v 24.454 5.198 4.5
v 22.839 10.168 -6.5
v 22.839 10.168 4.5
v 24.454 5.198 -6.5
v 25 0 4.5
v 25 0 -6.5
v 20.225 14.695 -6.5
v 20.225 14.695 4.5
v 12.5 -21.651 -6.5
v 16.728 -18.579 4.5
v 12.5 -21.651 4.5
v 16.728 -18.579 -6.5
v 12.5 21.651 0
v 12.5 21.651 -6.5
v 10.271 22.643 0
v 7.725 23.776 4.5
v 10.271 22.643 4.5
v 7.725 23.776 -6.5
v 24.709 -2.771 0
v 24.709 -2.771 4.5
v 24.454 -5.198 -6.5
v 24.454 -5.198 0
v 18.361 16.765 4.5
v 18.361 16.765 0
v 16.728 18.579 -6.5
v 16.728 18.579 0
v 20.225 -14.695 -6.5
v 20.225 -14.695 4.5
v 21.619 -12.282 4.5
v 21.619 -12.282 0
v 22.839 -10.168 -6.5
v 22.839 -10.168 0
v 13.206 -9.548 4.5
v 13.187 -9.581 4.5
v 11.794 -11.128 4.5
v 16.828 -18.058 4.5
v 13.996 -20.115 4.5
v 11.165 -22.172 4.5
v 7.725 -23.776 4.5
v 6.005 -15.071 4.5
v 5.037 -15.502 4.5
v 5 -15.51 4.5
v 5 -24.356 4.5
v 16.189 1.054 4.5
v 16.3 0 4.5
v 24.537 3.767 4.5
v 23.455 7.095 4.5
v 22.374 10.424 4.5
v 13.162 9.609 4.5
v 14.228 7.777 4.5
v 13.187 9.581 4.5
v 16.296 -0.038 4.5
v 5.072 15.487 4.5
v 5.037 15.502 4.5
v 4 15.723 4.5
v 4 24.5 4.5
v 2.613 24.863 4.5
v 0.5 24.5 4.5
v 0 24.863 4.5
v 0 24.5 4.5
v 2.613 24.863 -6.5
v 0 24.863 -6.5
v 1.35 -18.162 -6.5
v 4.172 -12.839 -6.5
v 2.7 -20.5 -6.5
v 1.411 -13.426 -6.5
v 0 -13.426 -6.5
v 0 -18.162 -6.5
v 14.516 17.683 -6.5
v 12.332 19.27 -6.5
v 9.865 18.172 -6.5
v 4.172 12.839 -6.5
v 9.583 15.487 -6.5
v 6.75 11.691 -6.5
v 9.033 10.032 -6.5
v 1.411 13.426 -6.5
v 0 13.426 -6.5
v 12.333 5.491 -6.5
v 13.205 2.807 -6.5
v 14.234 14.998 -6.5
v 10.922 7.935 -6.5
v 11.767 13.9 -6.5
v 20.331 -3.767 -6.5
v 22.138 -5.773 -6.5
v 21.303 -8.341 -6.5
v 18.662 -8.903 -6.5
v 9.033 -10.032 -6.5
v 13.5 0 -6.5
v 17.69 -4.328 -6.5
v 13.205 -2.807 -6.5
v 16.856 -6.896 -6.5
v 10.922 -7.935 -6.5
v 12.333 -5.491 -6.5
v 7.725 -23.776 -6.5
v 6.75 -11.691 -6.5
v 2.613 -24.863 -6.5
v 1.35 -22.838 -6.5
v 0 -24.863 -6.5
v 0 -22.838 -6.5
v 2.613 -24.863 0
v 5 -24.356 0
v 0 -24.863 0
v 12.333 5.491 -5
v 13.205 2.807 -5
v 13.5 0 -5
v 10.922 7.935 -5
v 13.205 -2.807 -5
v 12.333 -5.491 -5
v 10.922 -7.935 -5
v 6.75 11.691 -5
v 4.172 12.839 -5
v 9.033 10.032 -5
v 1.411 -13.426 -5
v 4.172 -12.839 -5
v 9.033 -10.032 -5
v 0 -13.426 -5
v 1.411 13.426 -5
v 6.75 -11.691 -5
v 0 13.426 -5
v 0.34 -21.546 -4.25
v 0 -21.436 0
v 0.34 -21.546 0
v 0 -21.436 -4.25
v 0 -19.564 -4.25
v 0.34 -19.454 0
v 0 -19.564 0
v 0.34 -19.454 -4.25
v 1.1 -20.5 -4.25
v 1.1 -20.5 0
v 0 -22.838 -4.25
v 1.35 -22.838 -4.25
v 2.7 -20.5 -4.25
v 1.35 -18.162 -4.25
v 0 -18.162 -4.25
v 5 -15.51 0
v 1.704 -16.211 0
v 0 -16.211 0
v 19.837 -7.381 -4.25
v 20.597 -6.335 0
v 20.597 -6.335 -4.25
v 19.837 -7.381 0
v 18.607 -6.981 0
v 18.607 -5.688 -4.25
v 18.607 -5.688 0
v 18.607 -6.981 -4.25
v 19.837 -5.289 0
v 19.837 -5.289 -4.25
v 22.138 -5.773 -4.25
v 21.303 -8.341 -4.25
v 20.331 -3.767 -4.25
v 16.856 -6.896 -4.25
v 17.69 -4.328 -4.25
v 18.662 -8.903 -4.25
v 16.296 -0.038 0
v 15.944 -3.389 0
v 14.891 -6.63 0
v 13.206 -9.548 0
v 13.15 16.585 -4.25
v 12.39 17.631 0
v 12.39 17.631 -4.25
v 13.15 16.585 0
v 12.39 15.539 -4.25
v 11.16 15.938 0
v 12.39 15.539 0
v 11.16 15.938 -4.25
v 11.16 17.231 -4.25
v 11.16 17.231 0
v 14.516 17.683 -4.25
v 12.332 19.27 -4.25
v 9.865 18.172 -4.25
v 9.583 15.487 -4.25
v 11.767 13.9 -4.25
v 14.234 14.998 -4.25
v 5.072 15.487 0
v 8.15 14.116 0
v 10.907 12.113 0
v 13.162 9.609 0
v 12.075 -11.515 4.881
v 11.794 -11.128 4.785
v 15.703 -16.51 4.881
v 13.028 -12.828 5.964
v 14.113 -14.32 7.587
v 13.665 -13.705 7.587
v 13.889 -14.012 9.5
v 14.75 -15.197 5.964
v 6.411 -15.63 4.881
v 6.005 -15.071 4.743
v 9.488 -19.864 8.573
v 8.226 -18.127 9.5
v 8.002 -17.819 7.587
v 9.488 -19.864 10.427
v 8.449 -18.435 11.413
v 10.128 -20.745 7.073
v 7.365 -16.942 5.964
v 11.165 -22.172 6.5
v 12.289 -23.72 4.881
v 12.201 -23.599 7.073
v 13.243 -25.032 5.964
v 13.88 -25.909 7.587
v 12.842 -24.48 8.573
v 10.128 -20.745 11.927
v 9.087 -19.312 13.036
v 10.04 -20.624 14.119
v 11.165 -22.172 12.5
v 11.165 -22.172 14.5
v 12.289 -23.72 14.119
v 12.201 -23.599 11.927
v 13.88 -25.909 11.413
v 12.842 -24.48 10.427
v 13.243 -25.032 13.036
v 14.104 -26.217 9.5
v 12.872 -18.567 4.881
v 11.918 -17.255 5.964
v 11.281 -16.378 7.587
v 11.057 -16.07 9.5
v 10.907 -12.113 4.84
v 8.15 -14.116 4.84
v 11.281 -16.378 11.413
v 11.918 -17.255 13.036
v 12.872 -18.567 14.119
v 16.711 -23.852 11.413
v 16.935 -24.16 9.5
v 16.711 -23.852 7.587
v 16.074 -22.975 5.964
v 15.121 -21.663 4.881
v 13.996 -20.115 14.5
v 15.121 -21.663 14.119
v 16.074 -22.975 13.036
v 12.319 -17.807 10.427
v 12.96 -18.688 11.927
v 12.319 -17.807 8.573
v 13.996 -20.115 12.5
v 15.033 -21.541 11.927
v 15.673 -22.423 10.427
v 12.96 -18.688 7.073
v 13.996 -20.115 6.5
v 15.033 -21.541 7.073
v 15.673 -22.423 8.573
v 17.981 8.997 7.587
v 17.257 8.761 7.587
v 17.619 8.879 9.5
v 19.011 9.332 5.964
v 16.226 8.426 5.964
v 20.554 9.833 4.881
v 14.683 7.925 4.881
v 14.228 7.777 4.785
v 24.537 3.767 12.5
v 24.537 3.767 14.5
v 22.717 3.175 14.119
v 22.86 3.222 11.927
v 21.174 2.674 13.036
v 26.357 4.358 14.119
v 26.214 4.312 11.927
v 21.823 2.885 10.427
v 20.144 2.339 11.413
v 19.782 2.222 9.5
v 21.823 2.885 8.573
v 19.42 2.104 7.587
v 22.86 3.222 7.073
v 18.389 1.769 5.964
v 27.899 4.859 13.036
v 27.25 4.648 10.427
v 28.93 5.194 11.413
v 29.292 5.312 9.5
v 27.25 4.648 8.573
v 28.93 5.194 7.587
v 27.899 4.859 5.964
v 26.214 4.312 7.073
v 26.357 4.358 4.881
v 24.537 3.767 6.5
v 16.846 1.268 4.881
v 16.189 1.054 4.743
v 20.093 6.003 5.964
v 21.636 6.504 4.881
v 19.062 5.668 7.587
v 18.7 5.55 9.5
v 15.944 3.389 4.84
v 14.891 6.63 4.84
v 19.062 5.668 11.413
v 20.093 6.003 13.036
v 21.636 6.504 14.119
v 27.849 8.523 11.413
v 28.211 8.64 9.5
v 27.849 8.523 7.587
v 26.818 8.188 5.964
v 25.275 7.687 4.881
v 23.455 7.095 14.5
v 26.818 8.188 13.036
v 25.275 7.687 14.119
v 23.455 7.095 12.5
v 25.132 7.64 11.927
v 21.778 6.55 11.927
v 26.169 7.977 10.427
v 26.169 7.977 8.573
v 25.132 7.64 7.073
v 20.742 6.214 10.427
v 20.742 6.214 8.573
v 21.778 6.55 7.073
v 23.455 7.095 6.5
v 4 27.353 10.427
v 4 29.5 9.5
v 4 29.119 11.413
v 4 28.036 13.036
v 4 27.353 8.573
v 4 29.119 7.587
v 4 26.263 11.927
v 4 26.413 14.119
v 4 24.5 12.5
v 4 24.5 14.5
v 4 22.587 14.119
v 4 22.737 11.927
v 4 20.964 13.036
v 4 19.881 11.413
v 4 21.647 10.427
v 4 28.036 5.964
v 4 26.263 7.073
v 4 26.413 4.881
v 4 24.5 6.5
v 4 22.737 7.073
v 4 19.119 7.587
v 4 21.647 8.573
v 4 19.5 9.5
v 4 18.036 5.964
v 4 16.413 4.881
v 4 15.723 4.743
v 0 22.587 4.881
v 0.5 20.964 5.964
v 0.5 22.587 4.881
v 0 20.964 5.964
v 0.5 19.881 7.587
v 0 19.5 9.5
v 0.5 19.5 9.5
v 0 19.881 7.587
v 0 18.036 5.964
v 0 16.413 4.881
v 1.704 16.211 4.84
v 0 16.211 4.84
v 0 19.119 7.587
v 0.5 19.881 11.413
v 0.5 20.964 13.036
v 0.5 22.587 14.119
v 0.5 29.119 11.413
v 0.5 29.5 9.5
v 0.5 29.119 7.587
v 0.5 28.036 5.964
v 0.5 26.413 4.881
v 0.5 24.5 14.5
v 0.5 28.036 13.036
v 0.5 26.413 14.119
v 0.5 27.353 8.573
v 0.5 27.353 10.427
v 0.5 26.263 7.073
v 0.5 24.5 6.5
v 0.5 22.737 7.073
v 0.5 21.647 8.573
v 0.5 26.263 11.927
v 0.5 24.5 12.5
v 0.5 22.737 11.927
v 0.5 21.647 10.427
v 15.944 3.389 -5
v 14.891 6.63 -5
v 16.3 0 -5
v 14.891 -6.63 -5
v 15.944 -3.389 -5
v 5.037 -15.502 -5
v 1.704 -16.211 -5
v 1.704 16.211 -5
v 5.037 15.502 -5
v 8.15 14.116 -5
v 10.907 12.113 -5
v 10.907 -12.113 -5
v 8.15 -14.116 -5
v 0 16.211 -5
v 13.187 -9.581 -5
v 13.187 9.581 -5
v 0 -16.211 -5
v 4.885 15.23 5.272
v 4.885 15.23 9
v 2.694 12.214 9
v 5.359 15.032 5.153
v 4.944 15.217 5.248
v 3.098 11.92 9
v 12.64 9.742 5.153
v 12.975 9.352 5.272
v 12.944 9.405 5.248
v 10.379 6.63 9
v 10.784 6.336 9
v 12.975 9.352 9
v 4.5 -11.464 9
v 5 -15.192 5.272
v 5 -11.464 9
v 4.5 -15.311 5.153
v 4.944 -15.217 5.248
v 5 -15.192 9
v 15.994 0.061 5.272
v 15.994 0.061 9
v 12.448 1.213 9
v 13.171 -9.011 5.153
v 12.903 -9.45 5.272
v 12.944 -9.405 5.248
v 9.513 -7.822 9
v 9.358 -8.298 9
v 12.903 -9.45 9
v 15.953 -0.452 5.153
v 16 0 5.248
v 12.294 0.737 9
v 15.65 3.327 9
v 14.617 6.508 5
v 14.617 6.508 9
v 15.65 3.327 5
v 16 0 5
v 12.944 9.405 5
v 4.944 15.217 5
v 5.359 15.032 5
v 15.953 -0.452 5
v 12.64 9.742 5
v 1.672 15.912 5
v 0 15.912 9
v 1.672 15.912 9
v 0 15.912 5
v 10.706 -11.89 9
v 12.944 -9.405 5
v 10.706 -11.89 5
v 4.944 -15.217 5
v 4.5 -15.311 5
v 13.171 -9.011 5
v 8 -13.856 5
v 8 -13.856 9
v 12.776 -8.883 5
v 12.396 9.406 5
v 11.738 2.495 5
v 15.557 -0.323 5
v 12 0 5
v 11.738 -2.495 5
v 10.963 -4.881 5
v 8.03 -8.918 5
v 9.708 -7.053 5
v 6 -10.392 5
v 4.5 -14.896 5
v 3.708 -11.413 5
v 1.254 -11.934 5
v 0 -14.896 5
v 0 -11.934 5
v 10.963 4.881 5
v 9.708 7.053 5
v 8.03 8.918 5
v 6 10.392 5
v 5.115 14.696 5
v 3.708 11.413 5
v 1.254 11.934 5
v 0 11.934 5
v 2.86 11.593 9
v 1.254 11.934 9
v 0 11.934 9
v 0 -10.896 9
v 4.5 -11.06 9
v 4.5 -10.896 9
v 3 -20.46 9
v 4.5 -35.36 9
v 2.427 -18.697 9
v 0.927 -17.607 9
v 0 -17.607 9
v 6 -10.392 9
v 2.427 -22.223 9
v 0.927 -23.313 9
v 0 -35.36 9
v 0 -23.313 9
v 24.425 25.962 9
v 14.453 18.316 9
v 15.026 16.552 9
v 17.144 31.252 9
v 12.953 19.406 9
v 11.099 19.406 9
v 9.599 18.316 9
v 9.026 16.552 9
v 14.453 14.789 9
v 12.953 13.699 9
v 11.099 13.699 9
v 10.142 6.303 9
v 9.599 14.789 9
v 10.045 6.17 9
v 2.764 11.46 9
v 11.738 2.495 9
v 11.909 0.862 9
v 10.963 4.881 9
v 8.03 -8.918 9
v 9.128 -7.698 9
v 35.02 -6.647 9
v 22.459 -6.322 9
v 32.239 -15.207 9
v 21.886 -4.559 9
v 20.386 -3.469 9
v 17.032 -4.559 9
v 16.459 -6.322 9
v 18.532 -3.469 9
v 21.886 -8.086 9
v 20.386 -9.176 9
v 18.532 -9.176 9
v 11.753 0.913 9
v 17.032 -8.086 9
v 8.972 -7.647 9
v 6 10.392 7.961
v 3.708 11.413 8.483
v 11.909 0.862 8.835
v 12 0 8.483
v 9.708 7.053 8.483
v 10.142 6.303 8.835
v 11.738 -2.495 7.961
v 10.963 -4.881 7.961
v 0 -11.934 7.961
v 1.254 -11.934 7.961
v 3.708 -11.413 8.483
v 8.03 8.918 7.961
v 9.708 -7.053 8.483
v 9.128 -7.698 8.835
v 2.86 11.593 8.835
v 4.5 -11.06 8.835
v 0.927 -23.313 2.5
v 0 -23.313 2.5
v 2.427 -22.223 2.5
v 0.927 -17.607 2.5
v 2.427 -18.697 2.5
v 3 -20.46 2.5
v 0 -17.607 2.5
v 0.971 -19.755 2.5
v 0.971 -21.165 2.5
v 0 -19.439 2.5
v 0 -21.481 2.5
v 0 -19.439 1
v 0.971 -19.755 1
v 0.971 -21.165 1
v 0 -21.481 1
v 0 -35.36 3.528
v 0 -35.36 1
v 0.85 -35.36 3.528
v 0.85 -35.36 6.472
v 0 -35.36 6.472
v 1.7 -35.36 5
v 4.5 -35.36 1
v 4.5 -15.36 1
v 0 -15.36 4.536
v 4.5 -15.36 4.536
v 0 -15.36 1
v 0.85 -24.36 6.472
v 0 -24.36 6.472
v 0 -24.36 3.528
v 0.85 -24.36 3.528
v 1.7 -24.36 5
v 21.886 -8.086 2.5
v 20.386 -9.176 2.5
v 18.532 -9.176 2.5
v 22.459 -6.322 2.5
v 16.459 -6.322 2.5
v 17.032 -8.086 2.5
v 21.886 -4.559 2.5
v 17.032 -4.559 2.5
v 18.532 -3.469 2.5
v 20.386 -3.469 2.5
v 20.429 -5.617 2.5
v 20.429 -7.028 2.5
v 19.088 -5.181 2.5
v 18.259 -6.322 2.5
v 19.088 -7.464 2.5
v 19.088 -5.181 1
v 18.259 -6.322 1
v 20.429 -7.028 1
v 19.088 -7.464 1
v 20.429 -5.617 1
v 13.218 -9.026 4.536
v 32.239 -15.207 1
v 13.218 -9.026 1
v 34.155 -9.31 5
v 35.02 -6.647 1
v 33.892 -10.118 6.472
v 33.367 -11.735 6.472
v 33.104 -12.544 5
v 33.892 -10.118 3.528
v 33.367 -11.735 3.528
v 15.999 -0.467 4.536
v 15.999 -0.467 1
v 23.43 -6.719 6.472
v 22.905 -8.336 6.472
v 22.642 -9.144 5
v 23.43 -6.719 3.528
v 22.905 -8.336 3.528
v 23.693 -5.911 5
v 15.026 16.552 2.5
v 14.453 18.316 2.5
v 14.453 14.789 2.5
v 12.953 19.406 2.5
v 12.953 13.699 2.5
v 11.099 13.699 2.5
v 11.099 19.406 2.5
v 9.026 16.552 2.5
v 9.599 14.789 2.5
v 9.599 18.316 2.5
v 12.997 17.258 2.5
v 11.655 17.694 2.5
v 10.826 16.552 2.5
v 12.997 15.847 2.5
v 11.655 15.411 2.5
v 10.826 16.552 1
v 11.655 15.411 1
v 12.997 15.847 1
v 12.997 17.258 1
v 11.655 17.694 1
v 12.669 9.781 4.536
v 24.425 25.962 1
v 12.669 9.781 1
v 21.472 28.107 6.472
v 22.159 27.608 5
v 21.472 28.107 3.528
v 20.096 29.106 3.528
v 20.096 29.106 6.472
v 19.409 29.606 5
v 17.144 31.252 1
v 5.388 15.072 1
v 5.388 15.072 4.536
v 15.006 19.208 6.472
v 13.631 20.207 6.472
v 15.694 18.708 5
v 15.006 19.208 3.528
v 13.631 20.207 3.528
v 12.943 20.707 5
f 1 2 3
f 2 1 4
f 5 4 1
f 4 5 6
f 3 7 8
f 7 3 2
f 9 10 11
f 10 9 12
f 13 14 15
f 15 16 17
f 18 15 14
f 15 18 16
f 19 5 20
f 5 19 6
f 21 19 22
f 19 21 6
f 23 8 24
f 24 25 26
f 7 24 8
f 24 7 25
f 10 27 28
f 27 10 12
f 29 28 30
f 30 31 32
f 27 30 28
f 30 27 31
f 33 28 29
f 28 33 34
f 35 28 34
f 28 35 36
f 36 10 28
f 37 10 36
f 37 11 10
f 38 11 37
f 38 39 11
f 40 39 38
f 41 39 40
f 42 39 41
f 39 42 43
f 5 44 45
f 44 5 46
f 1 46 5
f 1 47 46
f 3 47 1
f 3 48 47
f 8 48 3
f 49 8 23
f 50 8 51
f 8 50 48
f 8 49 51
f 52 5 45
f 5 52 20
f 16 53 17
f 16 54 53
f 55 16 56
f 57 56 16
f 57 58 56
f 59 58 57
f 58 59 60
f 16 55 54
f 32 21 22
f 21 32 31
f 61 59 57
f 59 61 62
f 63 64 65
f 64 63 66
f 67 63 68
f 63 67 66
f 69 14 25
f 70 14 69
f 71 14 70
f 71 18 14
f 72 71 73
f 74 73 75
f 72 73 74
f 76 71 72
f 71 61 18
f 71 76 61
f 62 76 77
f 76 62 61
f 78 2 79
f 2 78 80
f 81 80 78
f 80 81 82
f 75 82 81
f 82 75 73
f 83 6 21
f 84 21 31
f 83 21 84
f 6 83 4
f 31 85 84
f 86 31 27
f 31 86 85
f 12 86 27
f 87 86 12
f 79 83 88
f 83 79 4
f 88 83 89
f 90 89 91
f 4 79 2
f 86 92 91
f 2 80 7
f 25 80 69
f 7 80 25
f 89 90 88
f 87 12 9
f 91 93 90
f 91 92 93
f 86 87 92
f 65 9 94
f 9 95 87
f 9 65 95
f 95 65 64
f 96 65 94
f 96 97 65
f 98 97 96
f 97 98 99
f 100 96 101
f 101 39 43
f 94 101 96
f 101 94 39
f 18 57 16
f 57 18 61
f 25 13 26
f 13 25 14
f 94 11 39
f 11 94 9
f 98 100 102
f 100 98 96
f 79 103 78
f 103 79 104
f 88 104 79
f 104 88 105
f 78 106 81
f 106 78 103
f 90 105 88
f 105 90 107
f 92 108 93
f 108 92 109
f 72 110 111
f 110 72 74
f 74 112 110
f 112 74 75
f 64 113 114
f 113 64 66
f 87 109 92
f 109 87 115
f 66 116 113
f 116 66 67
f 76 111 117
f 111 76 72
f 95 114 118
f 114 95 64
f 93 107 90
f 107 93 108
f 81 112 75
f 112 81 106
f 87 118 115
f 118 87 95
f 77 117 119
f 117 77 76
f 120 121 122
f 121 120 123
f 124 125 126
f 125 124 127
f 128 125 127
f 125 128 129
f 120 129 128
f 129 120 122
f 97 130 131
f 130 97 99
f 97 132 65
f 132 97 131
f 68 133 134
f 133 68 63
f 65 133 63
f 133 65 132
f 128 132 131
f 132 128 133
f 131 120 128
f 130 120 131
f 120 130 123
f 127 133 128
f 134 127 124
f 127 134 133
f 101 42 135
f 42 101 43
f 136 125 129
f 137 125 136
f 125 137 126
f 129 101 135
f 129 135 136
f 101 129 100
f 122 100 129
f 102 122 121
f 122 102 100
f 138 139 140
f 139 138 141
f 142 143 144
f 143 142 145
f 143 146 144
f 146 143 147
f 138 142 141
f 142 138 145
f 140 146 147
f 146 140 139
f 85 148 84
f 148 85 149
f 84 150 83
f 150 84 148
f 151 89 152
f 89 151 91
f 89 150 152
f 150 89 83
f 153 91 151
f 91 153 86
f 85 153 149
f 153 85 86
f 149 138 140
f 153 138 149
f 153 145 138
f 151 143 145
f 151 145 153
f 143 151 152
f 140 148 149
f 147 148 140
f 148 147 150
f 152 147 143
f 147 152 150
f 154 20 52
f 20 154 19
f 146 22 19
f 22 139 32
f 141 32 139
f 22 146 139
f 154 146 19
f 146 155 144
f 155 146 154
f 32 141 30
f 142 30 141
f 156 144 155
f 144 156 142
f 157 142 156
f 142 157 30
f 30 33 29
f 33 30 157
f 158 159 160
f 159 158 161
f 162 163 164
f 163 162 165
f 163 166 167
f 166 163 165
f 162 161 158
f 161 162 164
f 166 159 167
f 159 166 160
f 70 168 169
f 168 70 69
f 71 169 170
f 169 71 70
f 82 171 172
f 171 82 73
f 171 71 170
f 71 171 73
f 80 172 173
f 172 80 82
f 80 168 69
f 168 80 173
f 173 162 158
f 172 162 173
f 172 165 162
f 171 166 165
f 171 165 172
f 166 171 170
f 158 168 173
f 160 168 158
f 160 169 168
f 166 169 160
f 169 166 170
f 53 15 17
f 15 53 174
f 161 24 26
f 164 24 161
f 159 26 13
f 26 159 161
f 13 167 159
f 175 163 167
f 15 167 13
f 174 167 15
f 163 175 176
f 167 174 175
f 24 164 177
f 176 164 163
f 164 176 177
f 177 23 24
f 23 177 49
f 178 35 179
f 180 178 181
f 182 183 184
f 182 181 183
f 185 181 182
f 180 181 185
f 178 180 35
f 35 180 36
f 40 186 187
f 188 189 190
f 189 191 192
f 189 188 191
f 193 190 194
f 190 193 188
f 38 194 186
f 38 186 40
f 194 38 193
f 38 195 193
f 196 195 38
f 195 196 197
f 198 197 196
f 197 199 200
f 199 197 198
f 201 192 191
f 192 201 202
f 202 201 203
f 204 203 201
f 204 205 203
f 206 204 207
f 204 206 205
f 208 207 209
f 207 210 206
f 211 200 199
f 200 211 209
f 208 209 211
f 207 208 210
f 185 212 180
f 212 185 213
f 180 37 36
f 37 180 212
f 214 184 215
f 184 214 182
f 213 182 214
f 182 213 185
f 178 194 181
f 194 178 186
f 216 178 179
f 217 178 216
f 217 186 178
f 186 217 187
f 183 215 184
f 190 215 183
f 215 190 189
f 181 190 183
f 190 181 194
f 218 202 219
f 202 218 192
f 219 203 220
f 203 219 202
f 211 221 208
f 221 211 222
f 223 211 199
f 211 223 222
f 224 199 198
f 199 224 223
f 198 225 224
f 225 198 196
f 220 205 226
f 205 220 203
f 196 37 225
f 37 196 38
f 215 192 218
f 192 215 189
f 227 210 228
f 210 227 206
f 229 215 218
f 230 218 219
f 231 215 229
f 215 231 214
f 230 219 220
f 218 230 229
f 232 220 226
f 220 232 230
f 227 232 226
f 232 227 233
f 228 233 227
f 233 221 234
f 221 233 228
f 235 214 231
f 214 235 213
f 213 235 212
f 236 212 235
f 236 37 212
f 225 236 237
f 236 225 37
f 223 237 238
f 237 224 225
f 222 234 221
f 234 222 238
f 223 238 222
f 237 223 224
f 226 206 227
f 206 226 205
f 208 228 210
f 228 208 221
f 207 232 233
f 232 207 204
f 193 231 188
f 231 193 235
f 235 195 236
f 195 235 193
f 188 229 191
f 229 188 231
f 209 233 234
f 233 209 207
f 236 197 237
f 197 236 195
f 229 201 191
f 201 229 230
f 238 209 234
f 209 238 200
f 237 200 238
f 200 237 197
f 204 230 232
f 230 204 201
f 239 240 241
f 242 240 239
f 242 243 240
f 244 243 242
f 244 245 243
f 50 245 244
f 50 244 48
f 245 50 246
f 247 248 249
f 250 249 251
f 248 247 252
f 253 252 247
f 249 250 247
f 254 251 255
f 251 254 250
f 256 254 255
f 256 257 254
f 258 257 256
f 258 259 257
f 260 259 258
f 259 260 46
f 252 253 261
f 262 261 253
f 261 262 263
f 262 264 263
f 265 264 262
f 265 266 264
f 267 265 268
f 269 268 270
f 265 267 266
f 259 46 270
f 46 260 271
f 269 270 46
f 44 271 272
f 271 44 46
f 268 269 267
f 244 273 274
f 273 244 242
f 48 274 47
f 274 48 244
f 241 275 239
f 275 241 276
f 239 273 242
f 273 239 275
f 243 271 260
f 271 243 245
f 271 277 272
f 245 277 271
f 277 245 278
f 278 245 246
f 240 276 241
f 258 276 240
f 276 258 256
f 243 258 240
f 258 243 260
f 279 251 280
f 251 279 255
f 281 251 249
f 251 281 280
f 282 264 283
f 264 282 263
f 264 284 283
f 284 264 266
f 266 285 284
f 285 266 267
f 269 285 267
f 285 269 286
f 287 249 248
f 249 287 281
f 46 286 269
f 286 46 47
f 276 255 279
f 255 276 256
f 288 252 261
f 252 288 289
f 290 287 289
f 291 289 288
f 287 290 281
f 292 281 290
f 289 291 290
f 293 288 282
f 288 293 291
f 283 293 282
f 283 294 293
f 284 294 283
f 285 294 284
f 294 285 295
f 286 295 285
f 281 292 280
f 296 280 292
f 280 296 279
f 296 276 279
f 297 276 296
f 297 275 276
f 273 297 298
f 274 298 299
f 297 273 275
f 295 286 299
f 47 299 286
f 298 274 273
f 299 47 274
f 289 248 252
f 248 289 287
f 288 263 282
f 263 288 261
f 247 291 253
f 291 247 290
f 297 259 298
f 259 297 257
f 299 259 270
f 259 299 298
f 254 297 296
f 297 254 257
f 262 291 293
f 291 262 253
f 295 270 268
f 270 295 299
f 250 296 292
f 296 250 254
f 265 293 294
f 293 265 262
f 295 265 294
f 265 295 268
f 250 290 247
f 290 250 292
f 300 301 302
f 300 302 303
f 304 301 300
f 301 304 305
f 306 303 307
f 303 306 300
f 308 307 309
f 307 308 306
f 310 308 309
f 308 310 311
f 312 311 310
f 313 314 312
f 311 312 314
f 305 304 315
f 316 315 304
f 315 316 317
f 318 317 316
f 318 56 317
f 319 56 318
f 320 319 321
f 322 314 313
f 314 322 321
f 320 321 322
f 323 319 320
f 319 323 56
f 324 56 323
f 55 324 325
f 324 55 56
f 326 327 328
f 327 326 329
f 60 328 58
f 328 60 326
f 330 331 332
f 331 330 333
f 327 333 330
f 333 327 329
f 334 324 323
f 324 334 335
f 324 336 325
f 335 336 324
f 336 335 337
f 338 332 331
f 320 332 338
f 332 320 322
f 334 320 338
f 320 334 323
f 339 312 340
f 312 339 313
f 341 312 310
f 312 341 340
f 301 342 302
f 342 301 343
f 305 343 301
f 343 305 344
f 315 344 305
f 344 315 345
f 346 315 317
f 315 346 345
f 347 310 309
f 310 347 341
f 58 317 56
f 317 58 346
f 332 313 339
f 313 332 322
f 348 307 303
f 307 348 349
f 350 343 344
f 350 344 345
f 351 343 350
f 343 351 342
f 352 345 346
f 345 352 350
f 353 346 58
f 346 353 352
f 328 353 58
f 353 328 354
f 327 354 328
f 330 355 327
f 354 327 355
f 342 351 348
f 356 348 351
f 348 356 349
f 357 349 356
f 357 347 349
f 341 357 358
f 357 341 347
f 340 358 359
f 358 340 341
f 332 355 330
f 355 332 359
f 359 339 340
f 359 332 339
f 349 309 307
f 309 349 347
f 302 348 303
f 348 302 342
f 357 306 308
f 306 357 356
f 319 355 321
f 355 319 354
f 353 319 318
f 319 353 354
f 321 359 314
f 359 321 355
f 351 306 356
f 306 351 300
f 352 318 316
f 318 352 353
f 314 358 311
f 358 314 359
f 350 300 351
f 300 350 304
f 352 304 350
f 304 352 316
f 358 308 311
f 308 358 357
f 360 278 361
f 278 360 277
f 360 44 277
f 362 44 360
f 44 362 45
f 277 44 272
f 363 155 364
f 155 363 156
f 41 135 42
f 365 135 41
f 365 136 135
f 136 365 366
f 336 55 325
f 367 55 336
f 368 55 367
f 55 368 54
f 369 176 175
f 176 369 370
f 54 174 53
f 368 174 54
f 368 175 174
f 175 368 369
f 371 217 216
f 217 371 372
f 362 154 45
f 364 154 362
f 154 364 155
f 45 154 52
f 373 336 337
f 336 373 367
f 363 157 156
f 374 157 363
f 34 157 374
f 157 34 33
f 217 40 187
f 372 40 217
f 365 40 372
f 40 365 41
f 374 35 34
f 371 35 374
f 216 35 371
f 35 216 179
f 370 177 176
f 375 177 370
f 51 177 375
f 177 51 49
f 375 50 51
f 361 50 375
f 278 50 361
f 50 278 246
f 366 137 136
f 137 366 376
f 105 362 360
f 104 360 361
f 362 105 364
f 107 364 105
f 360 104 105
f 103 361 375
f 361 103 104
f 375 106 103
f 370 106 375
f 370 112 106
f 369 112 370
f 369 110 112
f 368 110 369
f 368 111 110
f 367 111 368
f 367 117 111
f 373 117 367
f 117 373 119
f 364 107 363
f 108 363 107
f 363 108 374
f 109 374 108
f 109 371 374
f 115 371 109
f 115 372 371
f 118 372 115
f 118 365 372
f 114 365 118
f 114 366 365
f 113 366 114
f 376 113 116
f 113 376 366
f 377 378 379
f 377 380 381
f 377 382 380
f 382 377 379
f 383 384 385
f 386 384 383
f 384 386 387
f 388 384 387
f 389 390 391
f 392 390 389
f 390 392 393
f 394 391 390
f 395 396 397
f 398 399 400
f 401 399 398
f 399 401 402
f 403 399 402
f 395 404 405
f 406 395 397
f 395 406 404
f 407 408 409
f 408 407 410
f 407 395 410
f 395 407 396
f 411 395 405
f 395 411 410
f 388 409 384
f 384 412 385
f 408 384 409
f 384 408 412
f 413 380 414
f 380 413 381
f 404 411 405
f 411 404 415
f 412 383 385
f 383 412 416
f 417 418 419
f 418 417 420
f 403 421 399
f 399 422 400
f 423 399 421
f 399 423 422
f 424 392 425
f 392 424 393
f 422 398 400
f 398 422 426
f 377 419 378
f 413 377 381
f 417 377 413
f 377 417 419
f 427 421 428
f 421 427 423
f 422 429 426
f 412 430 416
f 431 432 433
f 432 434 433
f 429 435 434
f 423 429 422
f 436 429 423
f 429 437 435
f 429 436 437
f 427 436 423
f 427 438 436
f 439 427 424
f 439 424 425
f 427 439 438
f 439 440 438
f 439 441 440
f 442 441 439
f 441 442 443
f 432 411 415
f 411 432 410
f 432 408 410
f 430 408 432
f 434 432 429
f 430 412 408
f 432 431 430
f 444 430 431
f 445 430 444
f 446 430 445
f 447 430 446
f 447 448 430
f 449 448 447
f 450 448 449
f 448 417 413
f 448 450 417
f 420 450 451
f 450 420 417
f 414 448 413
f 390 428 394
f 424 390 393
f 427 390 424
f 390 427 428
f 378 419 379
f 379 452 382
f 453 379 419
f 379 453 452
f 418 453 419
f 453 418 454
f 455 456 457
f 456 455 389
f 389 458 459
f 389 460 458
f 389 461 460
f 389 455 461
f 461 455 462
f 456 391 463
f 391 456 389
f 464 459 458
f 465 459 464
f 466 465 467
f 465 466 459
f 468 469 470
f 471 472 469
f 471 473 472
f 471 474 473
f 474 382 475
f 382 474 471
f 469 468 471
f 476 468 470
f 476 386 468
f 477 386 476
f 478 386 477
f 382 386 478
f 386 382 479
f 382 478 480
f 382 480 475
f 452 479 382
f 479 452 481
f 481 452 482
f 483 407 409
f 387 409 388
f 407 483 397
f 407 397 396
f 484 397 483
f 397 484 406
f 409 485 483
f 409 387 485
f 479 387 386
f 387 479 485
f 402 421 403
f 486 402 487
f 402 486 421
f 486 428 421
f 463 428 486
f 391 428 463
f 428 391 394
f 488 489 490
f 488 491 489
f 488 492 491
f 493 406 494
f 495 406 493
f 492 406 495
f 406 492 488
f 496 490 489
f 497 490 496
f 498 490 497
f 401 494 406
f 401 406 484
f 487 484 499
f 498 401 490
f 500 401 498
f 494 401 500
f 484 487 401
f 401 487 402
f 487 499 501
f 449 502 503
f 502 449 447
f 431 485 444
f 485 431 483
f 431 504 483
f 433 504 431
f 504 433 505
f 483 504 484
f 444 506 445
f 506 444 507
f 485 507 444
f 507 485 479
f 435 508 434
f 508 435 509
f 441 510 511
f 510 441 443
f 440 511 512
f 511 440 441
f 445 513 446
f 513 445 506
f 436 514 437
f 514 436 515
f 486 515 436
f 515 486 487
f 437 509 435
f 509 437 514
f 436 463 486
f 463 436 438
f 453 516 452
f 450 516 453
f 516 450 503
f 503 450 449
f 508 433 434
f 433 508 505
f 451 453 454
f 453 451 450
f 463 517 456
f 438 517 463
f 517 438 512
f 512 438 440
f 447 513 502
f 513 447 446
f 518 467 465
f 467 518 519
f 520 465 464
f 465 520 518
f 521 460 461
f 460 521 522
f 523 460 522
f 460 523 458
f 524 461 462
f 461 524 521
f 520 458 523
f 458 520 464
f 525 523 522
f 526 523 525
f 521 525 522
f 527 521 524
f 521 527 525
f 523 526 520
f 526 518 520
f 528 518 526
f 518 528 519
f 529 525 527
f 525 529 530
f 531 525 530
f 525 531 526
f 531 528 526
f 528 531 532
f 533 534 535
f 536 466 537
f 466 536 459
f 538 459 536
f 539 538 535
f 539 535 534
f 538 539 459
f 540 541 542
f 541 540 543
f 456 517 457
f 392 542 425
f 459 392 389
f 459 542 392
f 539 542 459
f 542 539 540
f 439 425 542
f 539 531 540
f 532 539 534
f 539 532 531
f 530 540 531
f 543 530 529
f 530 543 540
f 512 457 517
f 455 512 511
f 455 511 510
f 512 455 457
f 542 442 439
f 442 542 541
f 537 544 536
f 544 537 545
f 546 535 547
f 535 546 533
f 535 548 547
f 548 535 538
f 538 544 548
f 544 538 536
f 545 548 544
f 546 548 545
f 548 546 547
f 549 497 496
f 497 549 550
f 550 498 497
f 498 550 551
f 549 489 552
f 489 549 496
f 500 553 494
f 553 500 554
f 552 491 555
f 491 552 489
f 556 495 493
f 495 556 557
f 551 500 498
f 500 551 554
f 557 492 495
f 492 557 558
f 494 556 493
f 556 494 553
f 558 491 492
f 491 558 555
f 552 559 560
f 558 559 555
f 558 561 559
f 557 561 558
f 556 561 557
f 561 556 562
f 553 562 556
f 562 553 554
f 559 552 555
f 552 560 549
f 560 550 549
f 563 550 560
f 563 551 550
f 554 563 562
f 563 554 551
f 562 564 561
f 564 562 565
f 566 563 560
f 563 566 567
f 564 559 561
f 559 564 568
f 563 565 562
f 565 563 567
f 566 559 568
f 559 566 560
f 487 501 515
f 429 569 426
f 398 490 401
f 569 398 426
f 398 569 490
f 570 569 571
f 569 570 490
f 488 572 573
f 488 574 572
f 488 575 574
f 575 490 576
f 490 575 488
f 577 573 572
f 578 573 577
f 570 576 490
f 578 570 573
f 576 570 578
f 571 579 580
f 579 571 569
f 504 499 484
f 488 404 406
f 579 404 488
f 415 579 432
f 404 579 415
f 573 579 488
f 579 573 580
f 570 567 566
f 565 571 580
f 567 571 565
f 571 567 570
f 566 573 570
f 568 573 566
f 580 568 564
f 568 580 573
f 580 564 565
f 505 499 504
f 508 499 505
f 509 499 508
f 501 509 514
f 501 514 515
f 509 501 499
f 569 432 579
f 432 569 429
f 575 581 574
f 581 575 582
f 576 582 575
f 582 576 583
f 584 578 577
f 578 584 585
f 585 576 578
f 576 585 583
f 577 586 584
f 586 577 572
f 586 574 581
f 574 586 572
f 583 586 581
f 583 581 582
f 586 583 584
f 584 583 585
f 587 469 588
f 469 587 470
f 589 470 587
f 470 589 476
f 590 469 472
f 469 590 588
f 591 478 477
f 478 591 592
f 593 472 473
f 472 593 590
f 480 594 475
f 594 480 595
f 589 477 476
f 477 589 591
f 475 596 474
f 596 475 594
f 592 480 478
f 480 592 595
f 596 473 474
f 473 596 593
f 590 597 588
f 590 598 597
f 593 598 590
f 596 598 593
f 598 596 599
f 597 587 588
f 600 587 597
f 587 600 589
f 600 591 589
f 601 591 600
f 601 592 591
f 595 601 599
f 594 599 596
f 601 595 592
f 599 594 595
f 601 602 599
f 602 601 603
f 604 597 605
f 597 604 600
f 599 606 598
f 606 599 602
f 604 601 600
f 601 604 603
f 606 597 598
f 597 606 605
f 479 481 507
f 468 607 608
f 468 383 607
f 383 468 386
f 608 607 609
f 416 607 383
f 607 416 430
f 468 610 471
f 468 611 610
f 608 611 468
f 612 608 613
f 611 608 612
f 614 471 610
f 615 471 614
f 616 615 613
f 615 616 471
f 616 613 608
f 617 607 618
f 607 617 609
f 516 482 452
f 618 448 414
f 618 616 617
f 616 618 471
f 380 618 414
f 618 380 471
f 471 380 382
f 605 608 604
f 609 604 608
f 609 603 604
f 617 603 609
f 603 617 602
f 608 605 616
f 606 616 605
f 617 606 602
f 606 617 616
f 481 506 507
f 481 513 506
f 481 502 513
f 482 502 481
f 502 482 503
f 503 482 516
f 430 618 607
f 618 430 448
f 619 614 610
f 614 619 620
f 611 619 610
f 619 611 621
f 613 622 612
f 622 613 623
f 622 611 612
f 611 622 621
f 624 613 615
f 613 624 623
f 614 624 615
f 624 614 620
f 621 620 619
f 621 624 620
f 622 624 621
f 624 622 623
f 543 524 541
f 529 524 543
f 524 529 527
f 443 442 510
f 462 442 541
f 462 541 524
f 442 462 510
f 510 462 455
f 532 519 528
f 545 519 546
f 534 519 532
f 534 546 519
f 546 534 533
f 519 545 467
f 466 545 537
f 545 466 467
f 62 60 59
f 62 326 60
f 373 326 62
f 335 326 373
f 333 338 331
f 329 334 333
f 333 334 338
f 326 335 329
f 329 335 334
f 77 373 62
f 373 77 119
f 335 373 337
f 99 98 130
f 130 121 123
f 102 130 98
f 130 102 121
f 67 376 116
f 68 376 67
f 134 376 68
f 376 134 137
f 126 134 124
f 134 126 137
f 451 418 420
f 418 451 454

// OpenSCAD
// file: ball_bearing.scad
module ballz(inner_radius, outer_radius, width, ball_size, nballz, _rotation)
{
    rotate(a = _rotation, v = [0, 0, 1])
    {
        for (i = [0:(360 / nballz):360])
        {
            rotate(i)
            {
                translate(v = [ (inner_radius + outer_radius) / 2, 0, 0 ])
                rotate(a = _rotation, v = [0, 0, 1])
                sphere(r = ball_size);
            }
        }
    } 
}

module ball_bearing(inner_radius, outer_radius, inner_opening, width, ball_size, tolerence, _rotation)
{
    union()
    {
        rotate_extrude()
        {
            difference()
            {

                translate(v = [ inner_radius + inner_opening/2, 0, 0 ]) square(size = [ inner_opening, width ], center = true);
                translate(v = [ (inner_radius + outer_radius) / 2, 0, 0 ]) circle(ball_size + tolerence);
            }
        }
        rotate(a = _rotation, v = [0, 0, 1]) 
        rotate_extrude()
        {
            difference()
            {
                translate(v = [ outer_radius - inner_opening/2, 0, 0 ]) square(size = [ inner_opening, width ], center = true);
                translate(v = [ (inner_radius + outer_radius) / 2, 0, 0 ]) circle(ball_size + tolerence);
            }
        }

        ballz(inner_radius, outer_radius, inner_opening, ball_size, 12, _rotation/2);
    }
}

// difference() {
// ball_bearing(
//     inner_radius=7.5,
//     outer_radius=16,
//     inner_opening=2.5,
//     width=5.8,
//     ball_size=2.9,
//     tolerence=.3
//     );
//     translate([0, 20, 0]) cube(size = 40, center=true);
// }

ball_bearing(
    inner_radius=7.5,
    outer_radius=16,
    inner_opening=2.5,
    width=9,
    ball_size=2.9,
    tolerence=.3
    );
// file: arm_holder.scad
module arm_holder(external_radius, internal_radius, width, tolerence)
{
    union()
    {
        scale(v = [1, 1, 2]) union() {
            difference() {
                cube(size = [external_radius, external_radius, width]);
                translate(v = [0, 0, width/2]) cylinder(h = width*2, r = external_radius, center = true);
            }
            translate(v = [0, external_radius*2, 0]) mirror(v = [0, 1, 0])  difference() {
                cube(size = [external_radius, external_radius, width]);
                translate(v = [0, 0, width/2]) cylinder(h = width*2, r = external_radius, center = true);
            }
        }

        difference()
        {
            translate(v = [0, 0, width/2]) cylinder(h = width, r = external_radius, center = true);
            cylinder(h = 13, r = internal_radius, center = true);
        }
    }
}


rotate(a = 90, v = [0, 1, 0]) arm_holder(5, 3, 4, .1);
// main file
use <arm_holder.scad>
use <ball_bearing.scad>

module base()
{
    difference()
    {
        union()
        {
            difference()
            {
                difference()
                {
                    translate([ 0, 0, -1 ]) cylinder(h = 11, r = 25, center = true);
                    translate(v = [ 0, 0, -7 ]) cylinder(h = 4.5, r = 13.5, center = true);
                }
                for (i = [0:(360 / 5):360])
                {
                    rotate(i)
                    {
                        translate(v = [ 0, -20.5, -2 ]) union()
                        {
                            cylinder(h = 14, r = 1.1, center = true);
                            translate(v = [ 0, 0, -3.5 ]) cylinder(h = 2.5, r = 2.7, center = true, $fn = 6);
                            translate(v = [ 0, 0, 5.5 ]) cube([ 10, 10, 7 ], center = true);
                        }
                    }
                }
            }
            for (i = [0 + 360 / 10:(360 / 5):360])
            {
                rotate(i)
                {
                    translate(v = [ -4, -24.5, 9.5 ])
                    {
                        rotate([ 0, 90, 0 ]) arm_holder(5, 3, 3.5, .1);
                    }
                }
            }
        }
        cylinder(h = 10, r = 16.3, center = true);
    }
}

module capot()
{
    difference()
    {
        cylinder(h = 4, r = 16, center = true);
        cylinder(h = 6, r = 12, center = true);
        for (i = [3 * 360 / 20:(360 / 5):360])
        {
            rotate(i)
            {
                translate(v = [ 17, 0, 0 ]) rotate(a = 45, v = [ 0, 1, 0 ]) cube(size = [ 15, 10, 5 ], center = true);
            }
        }
    }
}

module pin()
{
    difference()
    {
        union()
        {
            difference()
            {
                translate(v = [ 0, 0, 5 ]) cube(size = [ 9, 8, 20 ], center = true);

                translate(v = [ 0, 0, .1 ]) union()
                {
                    rotate(a = 90, v = [ 1, 0, 0 ]) translate(v = [ 0, 0, 5 ]) cylinder(h = 15, r = 3, center = true);
                    rotate(a = 90, v = [ 1, 0, 0 ]) translate(v = [ 0, 0, 5 ]) cylinder(h = 30, r = 1.2, center = true);
                }
            }
            translate(v = [ 0, 0, -9 ]) difference()
            {
                cube(size = [ 9, 8, 9 ], center = true);
                rotate(a = 45, v = [ 1, 0, 0 ]) translate(v = [ 0, 0, -3 ])
                    cube(size = [ 20, 20, 11 ], center = true);
            }
        }
        translate(v = [0, 0, 10]) 
        cylinder(h = 12, r = 1.7, center = true);
    }
}

module helix_mover()
{
    color("lightblue") base();
    translate(v = [ 0, 0, 7 ]) capot();
    for (i = [0:(360 / 5):360])
    {
        rotate(i) translate(v = [ 0, -20.36, 5 ]) rotate(a = 90, v = [ 1, 0, 0 ]) rotate(a = 180, v = [ 0, 0, 1 ])
            color("PaleGreen") pin();
    }
}

difference()
{
    helix_mover();
    translate(v = [ -200, 0, 0 ]) cube(size = [ 400, 400, 400 ], center = true);
}
